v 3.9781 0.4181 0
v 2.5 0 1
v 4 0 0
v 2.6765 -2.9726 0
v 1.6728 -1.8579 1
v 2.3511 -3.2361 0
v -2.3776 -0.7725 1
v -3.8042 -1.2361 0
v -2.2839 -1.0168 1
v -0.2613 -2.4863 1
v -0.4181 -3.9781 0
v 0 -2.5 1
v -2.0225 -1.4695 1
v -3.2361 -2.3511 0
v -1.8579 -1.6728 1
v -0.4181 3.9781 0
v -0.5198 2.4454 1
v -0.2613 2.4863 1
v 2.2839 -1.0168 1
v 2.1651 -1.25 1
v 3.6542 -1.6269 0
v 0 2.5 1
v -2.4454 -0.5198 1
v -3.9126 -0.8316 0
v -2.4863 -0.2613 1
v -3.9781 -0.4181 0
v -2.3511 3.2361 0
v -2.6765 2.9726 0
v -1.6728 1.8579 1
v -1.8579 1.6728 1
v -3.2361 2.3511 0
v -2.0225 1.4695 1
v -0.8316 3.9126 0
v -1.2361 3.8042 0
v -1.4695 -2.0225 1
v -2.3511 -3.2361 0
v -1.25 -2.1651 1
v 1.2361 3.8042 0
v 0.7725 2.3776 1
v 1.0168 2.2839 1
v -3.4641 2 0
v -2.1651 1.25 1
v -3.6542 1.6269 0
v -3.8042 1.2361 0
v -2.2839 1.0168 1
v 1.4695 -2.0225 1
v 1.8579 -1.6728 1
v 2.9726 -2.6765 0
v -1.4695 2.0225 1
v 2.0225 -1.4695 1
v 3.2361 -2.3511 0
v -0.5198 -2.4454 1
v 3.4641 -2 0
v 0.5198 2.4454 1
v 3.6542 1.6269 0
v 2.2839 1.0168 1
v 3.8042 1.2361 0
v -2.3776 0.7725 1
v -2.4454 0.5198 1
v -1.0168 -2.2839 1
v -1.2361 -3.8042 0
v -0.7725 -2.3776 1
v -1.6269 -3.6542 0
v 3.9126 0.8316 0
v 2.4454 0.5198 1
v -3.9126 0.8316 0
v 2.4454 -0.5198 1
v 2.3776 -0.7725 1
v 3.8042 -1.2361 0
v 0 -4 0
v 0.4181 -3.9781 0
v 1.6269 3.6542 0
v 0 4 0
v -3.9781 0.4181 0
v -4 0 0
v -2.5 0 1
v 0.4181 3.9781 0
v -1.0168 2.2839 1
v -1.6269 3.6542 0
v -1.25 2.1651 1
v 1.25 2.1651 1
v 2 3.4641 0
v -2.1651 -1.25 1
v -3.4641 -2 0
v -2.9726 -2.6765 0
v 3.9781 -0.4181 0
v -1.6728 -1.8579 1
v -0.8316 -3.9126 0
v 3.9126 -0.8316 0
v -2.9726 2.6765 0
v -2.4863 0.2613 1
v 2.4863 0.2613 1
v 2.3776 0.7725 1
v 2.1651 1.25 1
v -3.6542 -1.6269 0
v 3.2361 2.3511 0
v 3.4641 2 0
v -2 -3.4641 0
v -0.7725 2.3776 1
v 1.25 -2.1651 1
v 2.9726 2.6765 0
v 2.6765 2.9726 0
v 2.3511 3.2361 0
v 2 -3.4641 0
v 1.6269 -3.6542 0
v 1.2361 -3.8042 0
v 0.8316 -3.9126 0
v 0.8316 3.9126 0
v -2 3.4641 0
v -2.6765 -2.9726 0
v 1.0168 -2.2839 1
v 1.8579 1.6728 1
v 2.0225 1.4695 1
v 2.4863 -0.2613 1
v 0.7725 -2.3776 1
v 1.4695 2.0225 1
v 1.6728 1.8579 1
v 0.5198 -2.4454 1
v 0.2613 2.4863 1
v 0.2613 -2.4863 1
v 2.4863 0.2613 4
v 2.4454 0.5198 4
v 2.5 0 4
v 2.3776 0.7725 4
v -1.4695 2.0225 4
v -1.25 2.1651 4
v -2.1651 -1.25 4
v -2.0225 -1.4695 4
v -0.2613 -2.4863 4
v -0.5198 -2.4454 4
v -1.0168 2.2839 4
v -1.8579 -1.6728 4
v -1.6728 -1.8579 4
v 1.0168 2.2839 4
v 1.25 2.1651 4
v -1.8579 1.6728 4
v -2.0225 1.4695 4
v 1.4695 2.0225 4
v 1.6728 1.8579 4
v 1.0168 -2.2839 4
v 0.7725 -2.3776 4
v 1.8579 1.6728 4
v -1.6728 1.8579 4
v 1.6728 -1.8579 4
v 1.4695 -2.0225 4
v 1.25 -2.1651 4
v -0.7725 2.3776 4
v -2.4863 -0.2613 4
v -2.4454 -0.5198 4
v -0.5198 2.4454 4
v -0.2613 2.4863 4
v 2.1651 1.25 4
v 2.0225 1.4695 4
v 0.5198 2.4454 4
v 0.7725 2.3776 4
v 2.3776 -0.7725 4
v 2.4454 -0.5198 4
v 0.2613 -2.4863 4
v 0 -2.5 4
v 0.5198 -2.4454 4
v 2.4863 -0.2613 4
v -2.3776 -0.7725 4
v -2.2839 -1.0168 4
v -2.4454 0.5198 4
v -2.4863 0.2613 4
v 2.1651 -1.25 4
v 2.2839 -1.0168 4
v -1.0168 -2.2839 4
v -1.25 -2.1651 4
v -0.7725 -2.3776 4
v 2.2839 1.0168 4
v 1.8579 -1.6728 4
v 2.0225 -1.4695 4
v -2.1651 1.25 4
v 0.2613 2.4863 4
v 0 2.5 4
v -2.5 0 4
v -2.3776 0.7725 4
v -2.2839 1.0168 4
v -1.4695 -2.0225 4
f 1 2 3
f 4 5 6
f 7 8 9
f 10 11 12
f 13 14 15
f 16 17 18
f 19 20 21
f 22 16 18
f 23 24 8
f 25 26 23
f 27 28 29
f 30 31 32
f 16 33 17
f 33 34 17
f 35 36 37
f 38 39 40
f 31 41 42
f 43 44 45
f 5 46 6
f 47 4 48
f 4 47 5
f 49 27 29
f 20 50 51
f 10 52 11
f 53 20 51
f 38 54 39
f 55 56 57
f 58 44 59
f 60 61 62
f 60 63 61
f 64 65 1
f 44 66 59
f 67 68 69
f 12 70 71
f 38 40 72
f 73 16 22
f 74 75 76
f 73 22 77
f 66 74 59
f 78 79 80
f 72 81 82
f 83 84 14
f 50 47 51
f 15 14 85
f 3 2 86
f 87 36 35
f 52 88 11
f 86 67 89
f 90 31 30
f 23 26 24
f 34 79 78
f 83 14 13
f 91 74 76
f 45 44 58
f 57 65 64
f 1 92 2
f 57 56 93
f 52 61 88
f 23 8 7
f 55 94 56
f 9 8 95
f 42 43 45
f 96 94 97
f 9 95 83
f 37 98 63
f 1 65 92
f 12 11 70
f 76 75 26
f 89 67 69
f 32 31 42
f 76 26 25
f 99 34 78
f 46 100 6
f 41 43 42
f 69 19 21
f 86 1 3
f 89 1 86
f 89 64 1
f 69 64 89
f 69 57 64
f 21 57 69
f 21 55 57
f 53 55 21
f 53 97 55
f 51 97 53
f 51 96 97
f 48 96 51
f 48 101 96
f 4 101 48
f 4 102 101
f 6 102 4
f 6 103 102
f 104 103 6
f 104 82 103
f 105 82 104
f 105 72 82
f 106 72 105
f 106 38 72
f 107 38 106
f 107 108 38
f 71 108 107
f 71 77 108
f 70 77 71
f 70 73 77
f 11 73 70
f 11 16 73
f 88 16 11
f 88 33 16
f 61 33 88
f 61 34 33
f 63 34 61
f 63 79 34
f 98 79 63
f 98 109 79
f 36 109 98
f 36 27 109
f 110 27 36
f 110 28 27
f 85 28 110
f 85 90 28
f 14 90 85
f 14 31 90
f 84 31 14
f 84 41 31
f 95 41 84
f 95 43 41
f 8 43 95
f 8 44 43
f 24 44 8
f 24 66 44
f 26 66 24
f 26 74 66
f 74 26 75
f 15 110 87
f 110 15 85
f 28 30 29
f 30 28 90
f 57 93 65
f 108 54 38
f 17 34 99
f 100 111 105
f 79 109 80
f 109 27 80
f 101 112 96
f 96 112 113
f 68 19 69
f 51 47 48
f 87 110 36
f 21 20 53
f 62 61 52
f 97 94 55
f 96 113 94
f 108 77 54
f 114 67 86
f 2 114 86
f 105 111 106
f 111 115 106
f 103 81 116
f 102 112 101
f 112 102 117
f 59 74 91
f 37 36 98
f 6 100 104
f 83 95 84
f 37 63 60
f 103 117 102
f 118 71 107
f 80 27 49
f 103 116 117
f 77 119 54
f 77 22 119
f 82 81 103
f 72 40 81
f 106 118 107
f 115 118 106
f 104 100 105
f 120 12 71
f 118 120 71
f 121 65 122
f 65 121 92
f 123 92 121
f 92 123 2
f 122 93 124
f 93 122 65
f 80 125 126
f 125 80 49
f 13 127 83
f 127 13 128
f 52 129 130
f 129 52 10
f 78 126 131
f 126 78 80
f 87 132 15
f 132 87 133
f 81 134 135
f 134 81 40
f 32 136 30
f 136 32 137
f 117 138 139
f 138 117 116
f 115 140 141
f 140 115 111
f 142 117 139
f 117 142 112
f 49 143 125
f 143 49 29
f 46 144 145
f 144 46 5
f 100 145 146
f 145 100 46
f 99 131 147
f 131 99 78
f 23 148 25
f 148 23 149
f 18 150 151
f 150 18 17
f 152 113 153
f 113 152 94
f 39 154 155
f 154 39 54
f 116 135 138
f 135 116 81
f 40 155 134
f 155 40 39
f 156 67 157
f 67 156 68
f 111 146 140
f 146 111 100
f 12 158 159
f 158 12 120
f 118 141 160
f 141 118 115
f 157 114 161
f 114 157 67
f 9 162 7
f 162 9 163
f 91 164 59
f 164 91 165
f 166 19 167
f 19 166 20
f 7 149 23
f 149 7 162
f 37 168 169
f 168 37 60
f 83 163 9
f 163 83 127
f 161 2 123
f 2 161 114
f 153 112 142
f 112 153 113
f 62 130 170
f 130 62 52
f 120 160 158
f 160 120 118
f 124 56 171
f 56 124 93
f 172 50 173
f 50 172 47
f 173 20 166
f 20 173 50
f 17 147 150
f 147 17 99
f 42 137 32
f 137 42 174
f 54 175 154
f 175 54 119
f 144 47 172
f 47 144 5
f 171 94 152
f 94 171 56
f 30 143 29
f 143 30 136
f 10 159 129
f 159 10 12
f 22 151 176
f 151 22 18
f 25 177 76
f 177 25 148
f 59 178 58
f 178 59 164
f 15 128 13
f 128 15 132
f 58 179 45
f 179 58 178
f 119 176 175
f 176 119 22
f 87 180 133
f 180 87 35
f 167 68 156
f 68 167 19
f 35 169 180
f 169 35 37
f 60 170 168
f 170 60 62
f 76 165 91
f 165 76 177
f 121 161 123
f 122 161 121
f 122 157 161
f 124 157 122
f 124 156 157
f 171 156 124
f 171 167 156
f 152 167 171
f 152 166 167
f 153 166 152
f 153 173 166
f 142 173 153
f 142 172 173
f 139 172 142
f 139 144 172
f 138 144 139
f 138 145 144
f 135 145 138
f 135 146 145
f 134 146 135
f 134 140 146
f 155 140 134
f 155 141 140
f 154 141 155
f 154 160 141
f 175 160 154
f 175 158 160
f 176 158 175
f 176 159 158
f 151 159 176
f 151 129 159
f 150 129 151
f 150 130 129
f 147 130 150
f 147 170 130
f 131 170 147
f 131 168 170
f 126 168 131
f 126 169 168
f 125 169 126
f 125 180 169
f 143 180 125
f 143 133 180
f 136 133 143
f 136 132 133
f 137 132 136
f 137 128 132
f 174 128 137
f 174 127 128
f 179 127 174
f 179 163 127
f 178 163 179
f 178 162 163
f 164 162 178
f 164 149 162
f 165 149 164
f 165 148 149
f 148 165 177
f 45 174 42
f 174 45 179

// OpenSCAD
$fn = 60;

cylinder(d1=8, d2=5, h=1);
translate([0,0,1])
    cylinder(d=5, h=3);
